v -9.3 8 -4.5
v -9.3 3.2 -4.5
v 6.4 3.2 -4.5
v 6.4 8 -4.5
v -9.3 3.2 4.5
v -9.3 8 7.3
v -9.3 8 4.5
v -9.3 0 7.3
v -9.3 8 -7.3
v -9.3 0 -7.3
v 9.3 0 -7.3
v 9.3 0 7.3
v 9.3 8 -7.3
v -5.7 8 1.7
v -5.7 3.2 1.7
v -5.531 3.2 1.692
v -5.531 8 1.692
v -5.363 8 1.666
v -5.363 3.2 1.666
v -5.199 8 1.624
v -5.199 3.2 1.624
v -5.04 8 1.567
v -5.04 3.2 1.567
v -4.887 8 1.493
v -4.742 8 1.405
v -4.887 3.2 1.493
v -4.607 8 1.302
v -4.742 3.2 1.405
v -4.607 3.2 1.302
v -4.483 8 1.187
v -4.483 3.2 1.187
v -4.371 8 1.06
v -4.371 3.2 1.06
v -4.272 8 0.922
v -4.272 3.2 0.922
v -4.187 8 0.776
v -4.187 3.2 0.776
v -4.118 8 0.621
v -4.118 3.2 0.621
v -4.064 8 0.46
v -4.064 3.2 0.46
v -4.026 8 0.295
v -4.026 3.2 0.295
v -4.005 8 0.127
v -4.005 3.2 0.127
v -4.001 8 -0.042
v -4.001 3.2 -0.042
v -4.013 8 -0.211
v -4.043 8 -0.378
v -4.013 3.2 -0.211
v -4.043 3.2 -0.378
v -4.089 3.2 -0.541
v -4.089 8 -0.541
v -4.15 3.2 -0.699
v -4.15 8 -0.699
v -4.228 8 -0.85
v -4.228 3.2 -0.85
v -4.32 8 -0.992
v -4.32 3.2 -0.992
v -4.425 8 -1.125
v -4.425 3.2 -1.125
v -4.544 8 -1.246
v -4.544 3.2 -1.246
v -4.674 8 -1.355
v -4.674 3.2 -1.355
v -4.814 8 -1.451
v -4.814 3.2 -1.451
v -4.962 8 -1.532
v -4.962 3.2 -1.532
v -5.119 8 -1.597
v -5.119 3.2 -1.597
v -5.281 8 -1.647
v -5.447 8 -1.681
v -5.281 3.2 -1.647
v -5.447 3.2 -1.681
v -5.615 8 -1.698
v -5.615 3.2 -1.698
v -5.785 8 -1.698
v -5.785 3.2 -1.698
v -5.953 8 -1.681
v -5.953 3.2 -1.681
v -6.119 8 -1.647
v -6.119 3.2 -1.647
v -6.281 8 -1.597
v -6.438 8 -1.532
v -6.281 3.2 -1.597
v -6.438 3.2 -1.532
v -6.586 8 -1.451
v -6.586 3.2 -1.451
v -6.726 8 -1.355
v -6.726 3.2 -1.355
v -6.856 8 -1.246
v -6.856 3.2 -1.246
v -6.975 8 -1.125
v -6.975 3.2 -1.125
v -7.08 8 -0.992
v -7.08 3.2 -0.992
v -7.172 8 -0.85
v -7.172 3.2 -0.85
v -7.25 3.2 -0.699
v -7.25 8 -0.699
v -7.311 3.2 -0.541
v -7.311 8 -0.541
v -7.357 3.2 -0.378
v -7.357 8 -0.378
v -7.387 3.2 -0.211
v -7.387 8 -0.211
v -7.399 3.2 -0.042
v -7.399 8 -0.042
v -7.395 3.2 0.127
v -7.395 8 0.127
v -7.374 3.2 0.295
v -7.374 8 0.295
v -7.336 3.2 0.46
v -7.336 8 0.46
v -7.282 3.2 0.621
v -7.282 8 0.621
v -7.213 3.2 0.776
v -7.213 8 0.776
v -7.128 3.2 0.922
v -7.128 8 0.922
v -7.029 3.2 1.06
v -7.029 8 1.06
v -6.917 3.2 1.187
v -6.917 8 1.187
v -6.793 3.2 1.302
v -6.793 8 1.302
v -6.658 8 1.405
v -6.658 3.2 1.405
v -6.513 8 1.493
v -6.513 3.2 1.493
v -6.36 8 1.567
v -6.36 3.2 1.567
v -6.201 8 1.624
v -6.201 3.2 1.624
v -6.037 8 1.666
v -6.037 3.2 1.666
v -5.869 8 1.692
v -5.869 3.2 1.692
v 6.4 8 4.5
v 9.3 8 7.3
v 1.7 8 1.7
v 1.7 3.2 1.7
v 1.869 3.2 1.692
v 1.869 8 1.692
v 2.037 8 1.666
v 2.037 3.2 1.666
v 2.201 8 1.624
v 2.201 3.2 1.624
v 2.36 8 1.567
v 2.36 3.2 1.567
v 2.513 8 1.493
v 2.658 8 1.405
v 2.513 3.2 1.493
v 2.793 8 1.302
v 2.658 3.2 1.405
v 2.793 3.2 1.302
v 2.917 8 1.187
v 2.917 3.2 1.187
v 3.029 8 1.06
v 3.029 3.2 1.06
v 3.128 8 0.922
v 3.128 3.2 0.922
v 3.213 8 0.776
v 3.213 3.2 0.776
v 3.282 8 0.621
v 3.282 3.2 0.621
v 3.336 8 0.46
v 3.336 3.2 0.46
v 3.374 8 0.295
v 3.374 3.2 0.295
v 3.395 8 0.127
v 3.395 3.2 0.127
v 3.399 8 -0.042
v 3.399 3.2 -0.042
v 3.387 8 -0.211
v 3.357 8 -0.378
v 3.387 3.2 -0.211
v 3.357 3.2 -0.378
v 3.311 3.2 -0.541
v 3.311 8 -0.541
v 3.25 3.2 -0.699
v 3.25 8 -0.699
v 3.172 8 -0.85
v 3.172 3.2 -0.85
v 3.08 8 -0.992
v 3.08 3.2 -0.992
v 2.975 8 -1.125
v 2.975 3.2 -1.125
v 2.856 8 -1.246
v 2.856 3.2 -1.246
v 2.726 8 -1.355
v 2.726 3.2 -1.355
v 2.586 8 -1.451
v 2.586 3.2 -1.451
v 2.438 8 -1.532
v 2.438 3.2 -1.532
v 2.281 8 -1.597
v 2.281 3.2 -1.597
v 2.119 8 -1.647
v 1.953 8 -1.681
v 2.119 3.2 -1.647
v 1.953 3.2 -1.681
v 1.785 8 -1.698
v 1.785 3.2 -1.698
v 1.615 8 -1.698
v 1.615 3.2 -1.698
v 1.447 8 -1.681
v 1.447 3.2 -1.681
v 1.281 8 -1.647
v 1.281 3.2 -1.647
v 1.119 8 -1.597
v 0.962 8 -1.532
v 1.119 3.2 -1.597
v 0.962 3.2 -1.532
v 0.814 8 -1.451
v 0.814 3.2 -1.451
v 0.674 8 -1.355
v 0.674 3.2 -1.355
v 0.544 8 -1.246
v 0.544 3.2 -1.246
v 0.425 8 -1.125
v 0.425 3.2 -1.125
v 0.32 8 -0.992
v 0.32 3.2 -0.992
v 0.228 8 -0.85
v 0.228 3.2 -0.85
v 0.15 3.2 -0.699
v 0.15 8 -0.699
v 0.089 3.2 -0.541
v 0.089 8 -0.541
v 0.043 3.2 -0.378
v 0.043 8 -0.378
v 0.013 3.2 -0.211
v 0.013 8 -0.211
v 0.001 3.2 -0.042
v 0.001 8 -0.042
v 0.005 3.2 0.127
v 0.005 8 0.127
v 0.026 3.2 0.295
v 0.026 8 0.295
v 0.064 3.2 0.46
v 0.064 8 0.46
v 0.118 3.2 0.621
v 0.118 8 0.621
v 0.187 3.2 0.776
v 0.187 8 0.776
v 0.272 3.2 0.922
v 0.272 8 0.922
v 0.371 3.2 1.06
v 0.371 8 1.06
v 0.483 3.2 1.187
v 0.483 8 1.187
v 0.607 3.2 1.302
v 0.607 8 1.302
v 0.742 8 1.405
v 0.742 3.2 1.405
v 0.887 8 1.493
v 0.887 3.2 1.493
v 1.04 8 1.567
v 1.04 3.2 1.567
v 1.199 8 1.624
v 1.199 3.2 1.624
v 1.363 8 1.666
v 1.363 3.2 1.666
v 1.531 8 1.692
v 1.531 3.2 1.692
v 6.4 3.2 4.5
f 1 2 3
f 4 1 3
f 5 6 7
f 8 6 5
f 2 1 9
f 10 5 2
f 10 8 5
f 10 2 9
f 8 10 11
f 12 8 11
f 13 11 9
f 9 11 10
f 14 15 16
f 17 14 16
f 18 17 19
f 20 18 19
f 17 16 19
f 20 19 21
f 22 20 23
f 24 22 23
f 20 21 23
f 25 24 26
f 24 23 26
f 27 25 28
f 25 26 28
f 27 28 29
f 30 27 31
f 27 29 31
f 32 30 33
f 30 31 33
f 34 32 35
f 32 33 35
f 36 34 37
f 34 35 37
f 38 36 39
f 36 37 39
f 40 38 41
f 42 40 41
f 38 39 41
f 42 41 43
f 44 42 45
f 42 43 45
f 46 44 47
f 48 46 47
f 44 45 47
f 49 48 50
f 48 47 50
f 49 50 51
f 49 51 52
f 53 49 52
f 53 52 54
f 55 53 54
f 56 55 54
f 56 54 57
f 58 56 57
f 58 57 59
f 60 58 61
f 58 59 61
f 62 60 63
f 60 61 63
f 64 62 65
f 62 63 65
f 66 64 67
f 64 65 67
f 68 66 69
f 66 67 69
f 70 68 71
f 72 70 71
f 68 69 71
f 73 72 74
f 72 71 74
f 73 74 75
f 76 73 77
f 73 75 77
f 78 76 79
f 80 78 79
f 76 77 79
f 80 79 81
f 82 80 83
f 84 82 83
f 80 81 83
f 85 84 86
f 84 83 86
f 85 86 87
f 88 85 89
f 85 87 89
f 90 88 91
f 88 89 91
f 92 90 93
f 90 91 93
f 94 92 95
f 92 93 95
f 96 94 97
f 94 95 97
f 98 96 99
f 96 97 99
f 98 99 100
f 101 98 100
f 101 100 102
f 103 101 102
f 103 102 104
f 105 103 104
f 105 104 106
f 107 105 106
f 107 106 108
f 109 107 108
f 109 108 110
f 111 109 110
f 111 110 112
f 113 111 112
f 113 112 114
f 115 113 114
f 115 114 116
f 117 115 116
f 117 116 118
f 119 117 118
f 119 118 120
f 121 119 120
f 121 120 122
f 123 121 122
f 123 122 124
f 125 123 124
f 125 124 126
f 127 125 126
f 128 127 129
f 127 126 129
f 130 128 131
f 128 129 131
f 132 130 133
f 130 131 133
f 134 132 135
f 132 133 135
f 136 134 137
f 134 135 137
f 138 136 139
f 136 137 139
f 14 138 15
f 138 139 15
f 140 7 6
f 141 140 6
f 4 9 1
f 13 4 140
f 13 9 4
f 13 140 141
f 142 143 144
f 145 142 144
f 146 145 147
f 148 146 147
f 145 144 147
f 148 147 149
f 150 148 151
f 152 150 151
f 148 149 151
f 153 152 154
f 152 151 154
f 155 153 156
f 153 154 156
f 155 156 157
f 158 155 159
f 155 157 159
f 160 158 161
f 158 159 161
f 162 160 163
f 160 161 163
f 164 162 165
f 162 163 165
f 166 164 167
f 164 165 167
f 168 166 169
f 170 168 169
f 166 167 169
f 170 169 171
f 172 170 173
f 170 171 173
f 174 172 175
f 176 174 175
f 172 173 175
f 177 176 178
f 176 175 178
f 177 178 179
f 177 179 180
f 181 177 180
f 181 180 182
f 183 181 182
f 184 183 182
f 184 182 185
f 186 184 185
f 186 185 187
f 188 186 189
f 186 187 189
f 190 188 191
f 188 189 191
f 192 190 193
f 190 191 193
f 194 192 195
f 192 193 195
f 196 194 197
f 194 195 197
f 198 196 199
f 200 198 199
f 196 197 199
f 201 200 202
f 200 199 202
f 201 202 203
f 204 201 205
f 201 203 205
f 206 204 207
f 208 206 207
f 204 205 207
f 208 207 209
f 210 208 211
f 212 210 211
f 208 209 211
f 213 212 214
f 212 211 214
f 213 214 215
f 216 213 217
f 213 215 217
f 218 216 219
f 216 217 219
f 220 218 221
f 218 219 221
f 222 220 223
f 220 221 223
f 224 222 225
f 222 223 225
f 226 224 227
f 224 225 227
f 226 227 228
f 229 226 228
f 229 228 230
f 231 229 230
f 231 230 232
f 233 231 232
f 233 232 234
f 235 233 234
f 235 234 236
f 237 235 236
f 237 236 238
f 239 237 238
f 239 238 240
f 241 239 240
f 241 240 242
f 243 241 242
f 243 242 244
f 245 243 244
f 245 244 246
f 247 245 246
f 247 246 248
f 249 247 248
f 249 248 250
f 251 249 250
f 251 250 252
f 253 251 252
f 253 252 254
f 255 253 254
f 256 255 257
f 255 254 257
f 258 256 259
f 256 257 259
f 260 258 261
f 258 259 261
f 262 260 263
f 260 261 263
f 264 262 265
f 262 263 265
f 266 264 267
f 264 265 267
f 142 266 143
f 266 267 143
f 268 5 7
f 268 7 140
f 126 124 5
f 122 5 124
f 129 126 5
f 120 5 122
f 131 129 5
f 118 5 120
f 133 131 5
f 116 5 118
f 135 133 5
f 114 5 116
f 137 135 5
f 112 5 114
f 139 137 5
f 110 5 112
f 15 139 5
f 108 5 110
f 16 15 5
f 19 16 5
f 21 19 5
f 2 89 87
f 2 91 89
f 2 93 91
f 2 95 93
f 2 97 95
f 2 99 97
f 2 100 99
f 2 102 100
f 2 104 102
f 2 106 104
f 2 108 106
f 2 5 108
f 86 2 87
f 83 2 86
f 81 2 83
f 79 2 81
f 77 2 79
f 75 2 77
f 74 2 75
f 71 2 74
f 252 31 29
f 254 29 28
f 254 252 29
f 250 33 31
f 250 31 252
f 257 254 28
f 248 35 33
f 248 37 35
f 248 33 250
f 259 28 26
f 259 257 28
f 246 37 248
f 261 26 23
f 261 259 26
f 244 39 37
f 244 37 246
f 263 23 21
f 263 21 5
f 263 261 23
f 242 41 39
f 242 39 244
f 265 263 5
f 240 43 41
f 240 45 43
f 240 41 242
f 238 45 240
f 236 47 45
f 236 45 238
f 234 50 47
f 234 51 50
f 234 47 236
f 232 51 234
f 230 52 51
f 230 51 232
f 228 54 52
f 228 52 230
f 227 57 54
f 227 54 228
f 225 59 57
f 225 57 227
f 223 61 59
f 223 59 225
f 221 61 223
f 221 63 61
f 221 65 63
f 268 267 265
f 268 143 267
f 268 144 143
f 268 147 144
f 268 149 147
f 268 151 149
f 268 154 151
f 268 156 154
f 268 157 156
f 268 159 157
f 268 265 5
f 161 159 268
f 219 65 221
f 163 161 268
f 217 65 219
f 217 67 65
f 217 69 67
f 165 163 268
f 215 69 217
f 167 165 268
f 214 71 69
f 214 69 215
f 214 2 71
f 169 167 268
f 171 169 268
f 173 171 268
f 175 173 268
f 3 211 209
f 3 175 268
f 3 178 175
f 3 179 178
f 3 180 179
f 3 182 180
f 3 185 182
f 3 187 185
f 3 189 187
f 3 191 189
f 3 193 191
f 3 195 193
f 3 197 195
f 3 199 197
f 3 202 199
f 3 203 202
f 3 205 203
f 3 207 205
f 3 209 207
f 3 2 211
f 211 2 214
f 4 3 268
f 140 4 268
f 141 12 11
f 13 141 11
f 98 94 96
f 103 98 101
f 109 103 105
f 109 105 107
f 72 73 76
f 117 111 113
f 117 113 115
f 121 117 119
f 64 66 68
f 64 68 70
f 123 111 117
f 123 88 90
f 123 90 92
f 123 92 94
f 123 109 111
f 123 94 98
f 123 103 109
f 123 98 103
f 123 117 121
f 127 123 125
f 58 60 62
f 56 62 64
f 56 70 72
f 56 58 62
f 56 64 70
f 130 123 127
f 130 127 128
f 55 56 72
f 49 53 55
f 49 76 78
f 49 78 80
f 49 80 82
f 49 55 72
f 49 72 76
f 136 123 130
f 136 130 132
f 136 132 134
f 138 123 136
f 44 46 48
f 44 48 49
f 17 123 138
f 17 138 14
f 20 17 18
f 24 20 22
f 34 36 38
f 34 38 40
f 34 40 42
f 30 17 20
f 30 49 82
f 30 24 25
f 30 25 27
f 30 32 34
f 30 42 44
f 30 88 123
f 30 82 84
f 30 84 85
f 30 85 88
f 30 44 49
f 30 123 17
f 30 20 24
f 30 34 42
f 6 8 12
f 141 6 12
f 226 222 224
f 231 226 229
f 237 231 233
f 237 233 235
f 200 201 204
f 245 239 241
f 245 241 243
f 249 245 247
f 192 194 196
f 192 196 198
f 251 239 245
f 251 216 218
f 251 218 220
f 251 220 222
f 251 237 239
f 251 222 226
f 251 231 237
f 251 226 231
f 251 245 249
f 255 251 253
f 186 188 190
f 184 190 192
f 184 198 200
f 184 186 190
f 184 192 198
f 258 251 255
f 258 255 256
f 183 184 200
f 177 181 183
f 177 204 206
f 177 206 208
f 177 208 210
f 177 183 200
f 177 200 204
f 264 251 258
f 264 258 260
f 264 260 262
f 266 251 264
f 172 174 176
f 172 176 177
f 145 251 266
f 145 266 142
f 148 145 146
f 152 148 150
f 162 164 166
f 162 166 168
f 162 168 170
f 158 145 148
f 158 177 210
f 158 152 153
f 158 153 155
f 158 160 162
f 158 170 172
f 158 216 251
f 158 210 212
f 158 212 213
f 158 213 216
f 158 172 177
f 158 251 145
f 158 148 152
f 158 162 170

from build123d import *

# Parameters (mm, degrees)
SKETCH1_W           = 15.6
SKETCH1_H           = 14.6
SKETCH1_R           = 1.7
SKETCH1_W_2         = 3
BOSS_EXTRUDE1_DEPTH = 3.2
SKETCH4_W           = 15.7
SKETCH4_H           = 2.8
SKETCH4_R           = 1.7
BOSS_EXTRUDE3_DEPTH = 4.8


with BuildPart() as part:
    # Sketch1 → Boss-Extrude1 (new body)
    # profile 1 of 4: a face of its own
    with BuildSketch(Plane(origin=(0, 0, 0), x_dir=(1, 0, 0), z_dir=(0, 1, 0))):
        with Locations((-1.5, 0)):
            Rectangle(SKETCH1_W, SKETCH1_H)
        with Locations((-5.8, 0)):
            Circle(SKETCH1_R, mode=Mode.SUBTRACT)
        with Locations((1.6, 0)):
            Circle(SKETCH1_R, mode=Mode.SUBTRACT)
    # profile 2 of 4: a face of its own
    with BuildSketch(Plane(origin=(0, 0, 0), x_dir=(1, 0, 0), z_dir=(0, 1, 0))):
        with Locations((7.8, 0)):
            Rectangle(SKETCH1_W_2, SKETCH1_H)
    # profile 3 of 4: a face of its own
    with BuildSketch(Plane(origin=(0, 0, 0), x_dir=(1, 0, 0), z_dir=(0, 1, 0))):
        with Locations((1.6, 0)):
            Circle(SKETCH1_R)
    # profile 4 of 4: a face of its own
    with BuildSketch(Plane(origin=(0, 0, 0), x_dir=(1, 0, 0), z_dir=(0, 1, 0))):
        with Locations((-5.8, 0)):
            Circle(SKETCH1_R)
    extrude(amount=BOSS_EXTRUDE1_DEPTH)

    # Sketch4 → Boss-Extrude3 (add)
    with BuildSketch(Plane(origin=(0, 3.2, 0), x_dir=(1, 0, 0), z_dir=(0, 1, 0))):
        with Locations((-1.45, 5.9)):
            Rectangle(SKETCH4_W, SKETCH4_H)
        Polygon((6.4, -4.5), (6.4, -7.3), (9.3, -7.3), (9.3, 7.3), (6.4, 7.3), (6.4, 4.5), align=None)
        with Locations(Location((-5.7, 0, 0), (0, 0, 270))):
            Circle(SKETCH4_R)
        with Locations(Location((1.7, 0, 0), (0, 0, 270))):
            Circle(SKETCH4_R)
        with Locations((-1.45, -5.9)):
            Rectangle(SKETCH4_W, SKETCH4_H)
    extrude(amount=BOSS_EXTRUDE3_DEPTH)


solid = part.part
